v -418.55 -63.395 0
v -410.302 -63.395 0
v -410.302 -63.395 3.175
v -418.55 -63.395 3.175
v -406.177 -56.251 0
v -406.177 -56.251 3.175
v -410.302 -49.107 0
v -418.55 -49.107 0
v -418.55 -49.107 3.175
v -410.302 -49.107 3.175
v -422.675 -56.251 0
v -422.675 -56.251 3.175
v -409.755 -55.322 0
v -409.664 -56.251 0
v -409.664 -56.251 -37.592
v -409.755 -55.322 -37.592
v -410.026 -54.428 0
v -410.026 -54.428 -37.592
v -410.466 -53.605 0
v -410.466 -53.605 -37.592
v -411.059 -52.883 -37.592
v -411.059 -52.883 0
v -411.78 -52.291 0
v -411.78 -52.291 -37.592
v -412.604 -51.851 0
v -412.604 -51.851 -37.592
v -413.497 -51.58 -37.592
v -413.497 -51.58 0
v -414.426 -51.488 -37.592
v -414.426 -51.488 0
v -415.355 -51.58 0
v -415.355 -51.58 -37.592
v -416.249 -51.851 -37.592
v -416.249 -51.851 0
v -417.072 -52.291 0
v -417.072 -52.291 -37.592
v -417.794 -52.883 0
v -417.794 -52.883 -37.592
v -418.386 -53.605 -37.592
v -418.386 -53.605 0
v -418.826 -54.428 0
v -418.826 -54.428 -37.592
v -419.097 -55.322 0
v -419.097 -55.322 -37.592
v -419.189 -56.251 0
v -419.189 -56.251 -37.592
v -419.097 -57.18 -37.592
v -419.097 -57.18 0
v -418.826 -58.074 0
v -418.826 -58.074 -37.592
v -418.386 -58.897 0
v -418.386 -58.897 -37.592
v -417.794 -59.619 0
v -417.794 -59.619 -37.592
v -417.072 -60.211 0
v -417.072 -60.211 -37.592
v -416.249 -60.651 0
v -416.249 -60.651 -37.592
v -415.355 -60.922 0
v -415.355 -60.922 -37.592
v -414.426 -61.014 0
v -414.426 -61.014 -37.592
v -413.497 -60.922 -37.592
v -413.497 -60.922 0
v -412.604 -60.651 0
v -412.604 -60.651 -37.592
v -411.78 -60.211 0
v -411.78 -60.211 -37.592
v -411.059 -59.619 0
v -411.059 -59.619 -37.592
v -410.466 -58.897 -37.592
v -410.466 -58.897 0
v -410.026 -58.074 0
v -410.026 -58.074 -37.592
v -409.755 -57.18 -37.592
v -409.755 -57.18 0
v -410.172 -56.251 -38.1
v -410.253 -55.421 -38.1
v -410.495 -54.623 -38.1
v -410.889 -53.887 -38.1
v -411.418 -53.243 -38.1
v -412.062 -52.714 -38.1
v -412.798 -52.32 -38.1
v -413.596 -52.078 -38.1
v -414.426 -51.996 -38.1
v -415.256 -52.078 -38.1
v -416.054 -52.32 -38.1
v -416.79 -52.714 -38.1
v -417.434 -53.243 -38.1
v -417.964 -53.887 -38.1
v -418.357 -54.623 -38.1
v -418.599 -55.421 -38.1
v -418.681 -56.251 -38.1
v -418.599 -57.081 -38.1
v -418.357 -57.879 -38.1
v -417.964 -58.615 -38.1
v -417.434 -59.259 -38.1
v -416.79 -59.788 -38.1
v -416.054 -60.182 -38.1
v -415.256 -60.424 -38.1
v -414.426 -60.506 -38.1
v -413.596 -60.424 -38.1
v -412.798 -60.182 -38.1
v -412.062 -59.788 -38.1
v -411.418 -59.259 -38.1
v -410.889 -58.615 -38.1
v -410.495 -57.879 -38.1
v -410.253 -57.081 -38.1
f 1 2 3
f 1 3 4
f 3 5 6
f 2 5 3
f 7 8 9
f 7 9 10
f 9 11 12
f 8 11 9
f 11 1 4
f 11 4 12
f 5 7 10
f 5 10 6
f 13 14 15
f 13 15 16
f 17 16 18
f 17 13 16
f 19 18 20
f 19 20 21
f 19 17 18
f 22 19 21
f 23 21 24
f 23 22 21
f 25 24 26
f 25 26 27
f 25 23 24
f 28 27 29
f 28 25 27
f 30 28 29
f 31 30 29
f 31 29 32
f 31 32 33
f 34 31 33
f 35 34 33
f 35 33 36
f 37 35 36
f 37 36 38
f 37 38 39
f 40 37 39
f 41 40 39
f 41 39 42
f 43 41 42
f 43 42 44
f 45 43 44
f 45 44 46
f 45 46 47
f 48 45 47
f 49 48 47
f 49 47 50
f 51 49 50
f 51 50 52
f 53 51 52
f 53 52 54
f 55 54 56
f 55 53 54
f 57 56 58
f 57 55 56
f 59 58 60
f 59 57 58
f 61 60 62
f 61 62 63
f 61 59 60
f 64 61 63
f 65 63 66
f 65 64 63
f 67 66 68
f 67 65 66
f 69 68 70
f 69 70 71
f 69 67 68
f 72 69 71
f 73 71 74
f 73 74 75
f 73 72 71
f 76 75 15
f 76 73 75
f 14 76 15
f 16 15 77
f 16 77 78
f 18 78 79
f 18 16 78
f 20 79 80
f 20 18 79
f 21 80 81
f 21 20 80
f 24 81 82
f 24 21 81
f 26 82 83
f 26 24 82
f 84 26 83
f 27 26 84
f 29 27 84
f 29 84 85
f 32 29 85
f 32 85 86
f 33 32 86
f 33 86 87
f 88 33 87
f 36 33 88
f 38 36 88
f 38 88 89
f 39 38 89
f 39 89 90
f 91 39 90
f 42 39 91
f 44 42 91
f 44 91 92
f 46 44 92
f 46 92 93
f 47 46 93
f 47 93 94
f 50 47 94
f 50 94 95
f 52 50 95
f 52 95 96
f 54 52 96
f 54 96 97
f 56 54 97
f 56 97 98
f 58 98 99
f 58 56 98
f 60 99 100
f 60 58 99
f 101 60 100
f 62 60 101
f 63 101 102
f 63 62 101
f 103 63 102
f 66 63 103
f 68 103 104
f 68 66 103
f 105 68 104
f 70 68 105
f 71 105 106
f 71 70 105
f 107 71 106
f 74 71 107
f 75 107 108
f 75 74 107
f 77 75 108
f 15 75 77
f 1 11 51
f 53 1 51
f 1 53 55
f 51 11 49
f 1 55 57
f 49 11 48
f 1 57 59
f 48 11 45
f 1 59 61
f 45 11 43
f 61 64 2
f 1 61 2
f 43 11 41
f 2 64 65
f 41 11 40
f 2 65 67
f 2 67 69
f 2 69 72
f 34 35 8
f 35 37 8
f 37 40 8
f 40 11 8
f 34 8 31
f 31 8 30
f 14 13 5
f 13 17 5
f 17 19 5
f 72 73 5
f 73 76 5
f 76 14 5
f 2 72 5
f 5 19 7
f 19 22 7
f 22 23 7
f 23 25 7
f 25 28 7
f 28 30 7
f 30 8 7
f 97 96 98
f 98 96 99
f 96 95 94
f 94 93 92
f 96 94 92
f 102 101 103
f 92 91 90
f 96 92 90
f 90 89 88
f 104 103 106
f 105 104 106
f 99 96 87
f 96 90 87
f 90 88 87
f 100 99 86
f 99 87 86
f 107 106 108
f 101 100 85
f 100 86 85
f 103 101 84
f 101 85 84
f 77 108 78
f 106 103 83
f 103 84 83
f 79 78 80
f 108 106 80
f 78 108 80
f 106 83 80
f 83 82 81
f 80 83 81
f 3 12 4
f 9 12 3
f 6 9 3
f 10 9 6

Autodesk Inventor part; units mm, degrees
ref_plane "YZ Plane" through (0, 0, 0) normal (1, 0, 0) x (0, 1, 0)
ref_plane "XZ Plane" through (0, 0, 0) normal (0, 1, 0) x (-1, 0, 0)
ref_plane "XY Plane" through (0, 0, 0) normal (0, 0, 1) x (1, 0, 0)
sketch "Sketch1" plane through (0, 0, 0) normal (0, 0, 1) x (1, 0, 0)
  circle A0 centre (-414.4261, -56.251) radius 4.7625
  point P0 (0, 0)
  dimension "d0" = 9.525
extrude "Extrusion1" add sketch "Sketch1" against normal blind 38.1
sketch "Sketch2" plane through (-414.4261, -56.251, 0) normal (0, 0, 1) x (1, 0, 0)
  circle A0 centre (0, 0) radius 4.7625 projected
  line L0 (-8.2489, 0) -> (-4.1244, 7.1437)
  line L1 (-4.1244, 7.1437) -> (4.1244, 7.1438)
  line L2 (4.1244, 7.1438) -> (8.2489, 0)
  line L3 (8.2489, 0) -> (4.1244, -7.1437)
  line L4 (4.1244, -7.1437) -> (-4.1244, -7.1438)
  line L5 (-4.1244, -7.1438) -> (-8.2489, 0)
  point P0 (414.4261, 56.251)
  dimension "d3" = 14.2875
extrude "Extrusion2" add sketch "Sketch2" along normal blind 3.175 contours A0 | L0 L1 L2 L3 L4 L5
thread "Thread1" size "3/8-16 UNC" class "2A" standard "ANSI Unified Screw Threads" length 25.4
chamfer "Chamfer1" distance 0.508 angle 45 1 edges at (-419.1886, -56.251, -38.1)
properties part number "375 bolt x4" material "Steel"
